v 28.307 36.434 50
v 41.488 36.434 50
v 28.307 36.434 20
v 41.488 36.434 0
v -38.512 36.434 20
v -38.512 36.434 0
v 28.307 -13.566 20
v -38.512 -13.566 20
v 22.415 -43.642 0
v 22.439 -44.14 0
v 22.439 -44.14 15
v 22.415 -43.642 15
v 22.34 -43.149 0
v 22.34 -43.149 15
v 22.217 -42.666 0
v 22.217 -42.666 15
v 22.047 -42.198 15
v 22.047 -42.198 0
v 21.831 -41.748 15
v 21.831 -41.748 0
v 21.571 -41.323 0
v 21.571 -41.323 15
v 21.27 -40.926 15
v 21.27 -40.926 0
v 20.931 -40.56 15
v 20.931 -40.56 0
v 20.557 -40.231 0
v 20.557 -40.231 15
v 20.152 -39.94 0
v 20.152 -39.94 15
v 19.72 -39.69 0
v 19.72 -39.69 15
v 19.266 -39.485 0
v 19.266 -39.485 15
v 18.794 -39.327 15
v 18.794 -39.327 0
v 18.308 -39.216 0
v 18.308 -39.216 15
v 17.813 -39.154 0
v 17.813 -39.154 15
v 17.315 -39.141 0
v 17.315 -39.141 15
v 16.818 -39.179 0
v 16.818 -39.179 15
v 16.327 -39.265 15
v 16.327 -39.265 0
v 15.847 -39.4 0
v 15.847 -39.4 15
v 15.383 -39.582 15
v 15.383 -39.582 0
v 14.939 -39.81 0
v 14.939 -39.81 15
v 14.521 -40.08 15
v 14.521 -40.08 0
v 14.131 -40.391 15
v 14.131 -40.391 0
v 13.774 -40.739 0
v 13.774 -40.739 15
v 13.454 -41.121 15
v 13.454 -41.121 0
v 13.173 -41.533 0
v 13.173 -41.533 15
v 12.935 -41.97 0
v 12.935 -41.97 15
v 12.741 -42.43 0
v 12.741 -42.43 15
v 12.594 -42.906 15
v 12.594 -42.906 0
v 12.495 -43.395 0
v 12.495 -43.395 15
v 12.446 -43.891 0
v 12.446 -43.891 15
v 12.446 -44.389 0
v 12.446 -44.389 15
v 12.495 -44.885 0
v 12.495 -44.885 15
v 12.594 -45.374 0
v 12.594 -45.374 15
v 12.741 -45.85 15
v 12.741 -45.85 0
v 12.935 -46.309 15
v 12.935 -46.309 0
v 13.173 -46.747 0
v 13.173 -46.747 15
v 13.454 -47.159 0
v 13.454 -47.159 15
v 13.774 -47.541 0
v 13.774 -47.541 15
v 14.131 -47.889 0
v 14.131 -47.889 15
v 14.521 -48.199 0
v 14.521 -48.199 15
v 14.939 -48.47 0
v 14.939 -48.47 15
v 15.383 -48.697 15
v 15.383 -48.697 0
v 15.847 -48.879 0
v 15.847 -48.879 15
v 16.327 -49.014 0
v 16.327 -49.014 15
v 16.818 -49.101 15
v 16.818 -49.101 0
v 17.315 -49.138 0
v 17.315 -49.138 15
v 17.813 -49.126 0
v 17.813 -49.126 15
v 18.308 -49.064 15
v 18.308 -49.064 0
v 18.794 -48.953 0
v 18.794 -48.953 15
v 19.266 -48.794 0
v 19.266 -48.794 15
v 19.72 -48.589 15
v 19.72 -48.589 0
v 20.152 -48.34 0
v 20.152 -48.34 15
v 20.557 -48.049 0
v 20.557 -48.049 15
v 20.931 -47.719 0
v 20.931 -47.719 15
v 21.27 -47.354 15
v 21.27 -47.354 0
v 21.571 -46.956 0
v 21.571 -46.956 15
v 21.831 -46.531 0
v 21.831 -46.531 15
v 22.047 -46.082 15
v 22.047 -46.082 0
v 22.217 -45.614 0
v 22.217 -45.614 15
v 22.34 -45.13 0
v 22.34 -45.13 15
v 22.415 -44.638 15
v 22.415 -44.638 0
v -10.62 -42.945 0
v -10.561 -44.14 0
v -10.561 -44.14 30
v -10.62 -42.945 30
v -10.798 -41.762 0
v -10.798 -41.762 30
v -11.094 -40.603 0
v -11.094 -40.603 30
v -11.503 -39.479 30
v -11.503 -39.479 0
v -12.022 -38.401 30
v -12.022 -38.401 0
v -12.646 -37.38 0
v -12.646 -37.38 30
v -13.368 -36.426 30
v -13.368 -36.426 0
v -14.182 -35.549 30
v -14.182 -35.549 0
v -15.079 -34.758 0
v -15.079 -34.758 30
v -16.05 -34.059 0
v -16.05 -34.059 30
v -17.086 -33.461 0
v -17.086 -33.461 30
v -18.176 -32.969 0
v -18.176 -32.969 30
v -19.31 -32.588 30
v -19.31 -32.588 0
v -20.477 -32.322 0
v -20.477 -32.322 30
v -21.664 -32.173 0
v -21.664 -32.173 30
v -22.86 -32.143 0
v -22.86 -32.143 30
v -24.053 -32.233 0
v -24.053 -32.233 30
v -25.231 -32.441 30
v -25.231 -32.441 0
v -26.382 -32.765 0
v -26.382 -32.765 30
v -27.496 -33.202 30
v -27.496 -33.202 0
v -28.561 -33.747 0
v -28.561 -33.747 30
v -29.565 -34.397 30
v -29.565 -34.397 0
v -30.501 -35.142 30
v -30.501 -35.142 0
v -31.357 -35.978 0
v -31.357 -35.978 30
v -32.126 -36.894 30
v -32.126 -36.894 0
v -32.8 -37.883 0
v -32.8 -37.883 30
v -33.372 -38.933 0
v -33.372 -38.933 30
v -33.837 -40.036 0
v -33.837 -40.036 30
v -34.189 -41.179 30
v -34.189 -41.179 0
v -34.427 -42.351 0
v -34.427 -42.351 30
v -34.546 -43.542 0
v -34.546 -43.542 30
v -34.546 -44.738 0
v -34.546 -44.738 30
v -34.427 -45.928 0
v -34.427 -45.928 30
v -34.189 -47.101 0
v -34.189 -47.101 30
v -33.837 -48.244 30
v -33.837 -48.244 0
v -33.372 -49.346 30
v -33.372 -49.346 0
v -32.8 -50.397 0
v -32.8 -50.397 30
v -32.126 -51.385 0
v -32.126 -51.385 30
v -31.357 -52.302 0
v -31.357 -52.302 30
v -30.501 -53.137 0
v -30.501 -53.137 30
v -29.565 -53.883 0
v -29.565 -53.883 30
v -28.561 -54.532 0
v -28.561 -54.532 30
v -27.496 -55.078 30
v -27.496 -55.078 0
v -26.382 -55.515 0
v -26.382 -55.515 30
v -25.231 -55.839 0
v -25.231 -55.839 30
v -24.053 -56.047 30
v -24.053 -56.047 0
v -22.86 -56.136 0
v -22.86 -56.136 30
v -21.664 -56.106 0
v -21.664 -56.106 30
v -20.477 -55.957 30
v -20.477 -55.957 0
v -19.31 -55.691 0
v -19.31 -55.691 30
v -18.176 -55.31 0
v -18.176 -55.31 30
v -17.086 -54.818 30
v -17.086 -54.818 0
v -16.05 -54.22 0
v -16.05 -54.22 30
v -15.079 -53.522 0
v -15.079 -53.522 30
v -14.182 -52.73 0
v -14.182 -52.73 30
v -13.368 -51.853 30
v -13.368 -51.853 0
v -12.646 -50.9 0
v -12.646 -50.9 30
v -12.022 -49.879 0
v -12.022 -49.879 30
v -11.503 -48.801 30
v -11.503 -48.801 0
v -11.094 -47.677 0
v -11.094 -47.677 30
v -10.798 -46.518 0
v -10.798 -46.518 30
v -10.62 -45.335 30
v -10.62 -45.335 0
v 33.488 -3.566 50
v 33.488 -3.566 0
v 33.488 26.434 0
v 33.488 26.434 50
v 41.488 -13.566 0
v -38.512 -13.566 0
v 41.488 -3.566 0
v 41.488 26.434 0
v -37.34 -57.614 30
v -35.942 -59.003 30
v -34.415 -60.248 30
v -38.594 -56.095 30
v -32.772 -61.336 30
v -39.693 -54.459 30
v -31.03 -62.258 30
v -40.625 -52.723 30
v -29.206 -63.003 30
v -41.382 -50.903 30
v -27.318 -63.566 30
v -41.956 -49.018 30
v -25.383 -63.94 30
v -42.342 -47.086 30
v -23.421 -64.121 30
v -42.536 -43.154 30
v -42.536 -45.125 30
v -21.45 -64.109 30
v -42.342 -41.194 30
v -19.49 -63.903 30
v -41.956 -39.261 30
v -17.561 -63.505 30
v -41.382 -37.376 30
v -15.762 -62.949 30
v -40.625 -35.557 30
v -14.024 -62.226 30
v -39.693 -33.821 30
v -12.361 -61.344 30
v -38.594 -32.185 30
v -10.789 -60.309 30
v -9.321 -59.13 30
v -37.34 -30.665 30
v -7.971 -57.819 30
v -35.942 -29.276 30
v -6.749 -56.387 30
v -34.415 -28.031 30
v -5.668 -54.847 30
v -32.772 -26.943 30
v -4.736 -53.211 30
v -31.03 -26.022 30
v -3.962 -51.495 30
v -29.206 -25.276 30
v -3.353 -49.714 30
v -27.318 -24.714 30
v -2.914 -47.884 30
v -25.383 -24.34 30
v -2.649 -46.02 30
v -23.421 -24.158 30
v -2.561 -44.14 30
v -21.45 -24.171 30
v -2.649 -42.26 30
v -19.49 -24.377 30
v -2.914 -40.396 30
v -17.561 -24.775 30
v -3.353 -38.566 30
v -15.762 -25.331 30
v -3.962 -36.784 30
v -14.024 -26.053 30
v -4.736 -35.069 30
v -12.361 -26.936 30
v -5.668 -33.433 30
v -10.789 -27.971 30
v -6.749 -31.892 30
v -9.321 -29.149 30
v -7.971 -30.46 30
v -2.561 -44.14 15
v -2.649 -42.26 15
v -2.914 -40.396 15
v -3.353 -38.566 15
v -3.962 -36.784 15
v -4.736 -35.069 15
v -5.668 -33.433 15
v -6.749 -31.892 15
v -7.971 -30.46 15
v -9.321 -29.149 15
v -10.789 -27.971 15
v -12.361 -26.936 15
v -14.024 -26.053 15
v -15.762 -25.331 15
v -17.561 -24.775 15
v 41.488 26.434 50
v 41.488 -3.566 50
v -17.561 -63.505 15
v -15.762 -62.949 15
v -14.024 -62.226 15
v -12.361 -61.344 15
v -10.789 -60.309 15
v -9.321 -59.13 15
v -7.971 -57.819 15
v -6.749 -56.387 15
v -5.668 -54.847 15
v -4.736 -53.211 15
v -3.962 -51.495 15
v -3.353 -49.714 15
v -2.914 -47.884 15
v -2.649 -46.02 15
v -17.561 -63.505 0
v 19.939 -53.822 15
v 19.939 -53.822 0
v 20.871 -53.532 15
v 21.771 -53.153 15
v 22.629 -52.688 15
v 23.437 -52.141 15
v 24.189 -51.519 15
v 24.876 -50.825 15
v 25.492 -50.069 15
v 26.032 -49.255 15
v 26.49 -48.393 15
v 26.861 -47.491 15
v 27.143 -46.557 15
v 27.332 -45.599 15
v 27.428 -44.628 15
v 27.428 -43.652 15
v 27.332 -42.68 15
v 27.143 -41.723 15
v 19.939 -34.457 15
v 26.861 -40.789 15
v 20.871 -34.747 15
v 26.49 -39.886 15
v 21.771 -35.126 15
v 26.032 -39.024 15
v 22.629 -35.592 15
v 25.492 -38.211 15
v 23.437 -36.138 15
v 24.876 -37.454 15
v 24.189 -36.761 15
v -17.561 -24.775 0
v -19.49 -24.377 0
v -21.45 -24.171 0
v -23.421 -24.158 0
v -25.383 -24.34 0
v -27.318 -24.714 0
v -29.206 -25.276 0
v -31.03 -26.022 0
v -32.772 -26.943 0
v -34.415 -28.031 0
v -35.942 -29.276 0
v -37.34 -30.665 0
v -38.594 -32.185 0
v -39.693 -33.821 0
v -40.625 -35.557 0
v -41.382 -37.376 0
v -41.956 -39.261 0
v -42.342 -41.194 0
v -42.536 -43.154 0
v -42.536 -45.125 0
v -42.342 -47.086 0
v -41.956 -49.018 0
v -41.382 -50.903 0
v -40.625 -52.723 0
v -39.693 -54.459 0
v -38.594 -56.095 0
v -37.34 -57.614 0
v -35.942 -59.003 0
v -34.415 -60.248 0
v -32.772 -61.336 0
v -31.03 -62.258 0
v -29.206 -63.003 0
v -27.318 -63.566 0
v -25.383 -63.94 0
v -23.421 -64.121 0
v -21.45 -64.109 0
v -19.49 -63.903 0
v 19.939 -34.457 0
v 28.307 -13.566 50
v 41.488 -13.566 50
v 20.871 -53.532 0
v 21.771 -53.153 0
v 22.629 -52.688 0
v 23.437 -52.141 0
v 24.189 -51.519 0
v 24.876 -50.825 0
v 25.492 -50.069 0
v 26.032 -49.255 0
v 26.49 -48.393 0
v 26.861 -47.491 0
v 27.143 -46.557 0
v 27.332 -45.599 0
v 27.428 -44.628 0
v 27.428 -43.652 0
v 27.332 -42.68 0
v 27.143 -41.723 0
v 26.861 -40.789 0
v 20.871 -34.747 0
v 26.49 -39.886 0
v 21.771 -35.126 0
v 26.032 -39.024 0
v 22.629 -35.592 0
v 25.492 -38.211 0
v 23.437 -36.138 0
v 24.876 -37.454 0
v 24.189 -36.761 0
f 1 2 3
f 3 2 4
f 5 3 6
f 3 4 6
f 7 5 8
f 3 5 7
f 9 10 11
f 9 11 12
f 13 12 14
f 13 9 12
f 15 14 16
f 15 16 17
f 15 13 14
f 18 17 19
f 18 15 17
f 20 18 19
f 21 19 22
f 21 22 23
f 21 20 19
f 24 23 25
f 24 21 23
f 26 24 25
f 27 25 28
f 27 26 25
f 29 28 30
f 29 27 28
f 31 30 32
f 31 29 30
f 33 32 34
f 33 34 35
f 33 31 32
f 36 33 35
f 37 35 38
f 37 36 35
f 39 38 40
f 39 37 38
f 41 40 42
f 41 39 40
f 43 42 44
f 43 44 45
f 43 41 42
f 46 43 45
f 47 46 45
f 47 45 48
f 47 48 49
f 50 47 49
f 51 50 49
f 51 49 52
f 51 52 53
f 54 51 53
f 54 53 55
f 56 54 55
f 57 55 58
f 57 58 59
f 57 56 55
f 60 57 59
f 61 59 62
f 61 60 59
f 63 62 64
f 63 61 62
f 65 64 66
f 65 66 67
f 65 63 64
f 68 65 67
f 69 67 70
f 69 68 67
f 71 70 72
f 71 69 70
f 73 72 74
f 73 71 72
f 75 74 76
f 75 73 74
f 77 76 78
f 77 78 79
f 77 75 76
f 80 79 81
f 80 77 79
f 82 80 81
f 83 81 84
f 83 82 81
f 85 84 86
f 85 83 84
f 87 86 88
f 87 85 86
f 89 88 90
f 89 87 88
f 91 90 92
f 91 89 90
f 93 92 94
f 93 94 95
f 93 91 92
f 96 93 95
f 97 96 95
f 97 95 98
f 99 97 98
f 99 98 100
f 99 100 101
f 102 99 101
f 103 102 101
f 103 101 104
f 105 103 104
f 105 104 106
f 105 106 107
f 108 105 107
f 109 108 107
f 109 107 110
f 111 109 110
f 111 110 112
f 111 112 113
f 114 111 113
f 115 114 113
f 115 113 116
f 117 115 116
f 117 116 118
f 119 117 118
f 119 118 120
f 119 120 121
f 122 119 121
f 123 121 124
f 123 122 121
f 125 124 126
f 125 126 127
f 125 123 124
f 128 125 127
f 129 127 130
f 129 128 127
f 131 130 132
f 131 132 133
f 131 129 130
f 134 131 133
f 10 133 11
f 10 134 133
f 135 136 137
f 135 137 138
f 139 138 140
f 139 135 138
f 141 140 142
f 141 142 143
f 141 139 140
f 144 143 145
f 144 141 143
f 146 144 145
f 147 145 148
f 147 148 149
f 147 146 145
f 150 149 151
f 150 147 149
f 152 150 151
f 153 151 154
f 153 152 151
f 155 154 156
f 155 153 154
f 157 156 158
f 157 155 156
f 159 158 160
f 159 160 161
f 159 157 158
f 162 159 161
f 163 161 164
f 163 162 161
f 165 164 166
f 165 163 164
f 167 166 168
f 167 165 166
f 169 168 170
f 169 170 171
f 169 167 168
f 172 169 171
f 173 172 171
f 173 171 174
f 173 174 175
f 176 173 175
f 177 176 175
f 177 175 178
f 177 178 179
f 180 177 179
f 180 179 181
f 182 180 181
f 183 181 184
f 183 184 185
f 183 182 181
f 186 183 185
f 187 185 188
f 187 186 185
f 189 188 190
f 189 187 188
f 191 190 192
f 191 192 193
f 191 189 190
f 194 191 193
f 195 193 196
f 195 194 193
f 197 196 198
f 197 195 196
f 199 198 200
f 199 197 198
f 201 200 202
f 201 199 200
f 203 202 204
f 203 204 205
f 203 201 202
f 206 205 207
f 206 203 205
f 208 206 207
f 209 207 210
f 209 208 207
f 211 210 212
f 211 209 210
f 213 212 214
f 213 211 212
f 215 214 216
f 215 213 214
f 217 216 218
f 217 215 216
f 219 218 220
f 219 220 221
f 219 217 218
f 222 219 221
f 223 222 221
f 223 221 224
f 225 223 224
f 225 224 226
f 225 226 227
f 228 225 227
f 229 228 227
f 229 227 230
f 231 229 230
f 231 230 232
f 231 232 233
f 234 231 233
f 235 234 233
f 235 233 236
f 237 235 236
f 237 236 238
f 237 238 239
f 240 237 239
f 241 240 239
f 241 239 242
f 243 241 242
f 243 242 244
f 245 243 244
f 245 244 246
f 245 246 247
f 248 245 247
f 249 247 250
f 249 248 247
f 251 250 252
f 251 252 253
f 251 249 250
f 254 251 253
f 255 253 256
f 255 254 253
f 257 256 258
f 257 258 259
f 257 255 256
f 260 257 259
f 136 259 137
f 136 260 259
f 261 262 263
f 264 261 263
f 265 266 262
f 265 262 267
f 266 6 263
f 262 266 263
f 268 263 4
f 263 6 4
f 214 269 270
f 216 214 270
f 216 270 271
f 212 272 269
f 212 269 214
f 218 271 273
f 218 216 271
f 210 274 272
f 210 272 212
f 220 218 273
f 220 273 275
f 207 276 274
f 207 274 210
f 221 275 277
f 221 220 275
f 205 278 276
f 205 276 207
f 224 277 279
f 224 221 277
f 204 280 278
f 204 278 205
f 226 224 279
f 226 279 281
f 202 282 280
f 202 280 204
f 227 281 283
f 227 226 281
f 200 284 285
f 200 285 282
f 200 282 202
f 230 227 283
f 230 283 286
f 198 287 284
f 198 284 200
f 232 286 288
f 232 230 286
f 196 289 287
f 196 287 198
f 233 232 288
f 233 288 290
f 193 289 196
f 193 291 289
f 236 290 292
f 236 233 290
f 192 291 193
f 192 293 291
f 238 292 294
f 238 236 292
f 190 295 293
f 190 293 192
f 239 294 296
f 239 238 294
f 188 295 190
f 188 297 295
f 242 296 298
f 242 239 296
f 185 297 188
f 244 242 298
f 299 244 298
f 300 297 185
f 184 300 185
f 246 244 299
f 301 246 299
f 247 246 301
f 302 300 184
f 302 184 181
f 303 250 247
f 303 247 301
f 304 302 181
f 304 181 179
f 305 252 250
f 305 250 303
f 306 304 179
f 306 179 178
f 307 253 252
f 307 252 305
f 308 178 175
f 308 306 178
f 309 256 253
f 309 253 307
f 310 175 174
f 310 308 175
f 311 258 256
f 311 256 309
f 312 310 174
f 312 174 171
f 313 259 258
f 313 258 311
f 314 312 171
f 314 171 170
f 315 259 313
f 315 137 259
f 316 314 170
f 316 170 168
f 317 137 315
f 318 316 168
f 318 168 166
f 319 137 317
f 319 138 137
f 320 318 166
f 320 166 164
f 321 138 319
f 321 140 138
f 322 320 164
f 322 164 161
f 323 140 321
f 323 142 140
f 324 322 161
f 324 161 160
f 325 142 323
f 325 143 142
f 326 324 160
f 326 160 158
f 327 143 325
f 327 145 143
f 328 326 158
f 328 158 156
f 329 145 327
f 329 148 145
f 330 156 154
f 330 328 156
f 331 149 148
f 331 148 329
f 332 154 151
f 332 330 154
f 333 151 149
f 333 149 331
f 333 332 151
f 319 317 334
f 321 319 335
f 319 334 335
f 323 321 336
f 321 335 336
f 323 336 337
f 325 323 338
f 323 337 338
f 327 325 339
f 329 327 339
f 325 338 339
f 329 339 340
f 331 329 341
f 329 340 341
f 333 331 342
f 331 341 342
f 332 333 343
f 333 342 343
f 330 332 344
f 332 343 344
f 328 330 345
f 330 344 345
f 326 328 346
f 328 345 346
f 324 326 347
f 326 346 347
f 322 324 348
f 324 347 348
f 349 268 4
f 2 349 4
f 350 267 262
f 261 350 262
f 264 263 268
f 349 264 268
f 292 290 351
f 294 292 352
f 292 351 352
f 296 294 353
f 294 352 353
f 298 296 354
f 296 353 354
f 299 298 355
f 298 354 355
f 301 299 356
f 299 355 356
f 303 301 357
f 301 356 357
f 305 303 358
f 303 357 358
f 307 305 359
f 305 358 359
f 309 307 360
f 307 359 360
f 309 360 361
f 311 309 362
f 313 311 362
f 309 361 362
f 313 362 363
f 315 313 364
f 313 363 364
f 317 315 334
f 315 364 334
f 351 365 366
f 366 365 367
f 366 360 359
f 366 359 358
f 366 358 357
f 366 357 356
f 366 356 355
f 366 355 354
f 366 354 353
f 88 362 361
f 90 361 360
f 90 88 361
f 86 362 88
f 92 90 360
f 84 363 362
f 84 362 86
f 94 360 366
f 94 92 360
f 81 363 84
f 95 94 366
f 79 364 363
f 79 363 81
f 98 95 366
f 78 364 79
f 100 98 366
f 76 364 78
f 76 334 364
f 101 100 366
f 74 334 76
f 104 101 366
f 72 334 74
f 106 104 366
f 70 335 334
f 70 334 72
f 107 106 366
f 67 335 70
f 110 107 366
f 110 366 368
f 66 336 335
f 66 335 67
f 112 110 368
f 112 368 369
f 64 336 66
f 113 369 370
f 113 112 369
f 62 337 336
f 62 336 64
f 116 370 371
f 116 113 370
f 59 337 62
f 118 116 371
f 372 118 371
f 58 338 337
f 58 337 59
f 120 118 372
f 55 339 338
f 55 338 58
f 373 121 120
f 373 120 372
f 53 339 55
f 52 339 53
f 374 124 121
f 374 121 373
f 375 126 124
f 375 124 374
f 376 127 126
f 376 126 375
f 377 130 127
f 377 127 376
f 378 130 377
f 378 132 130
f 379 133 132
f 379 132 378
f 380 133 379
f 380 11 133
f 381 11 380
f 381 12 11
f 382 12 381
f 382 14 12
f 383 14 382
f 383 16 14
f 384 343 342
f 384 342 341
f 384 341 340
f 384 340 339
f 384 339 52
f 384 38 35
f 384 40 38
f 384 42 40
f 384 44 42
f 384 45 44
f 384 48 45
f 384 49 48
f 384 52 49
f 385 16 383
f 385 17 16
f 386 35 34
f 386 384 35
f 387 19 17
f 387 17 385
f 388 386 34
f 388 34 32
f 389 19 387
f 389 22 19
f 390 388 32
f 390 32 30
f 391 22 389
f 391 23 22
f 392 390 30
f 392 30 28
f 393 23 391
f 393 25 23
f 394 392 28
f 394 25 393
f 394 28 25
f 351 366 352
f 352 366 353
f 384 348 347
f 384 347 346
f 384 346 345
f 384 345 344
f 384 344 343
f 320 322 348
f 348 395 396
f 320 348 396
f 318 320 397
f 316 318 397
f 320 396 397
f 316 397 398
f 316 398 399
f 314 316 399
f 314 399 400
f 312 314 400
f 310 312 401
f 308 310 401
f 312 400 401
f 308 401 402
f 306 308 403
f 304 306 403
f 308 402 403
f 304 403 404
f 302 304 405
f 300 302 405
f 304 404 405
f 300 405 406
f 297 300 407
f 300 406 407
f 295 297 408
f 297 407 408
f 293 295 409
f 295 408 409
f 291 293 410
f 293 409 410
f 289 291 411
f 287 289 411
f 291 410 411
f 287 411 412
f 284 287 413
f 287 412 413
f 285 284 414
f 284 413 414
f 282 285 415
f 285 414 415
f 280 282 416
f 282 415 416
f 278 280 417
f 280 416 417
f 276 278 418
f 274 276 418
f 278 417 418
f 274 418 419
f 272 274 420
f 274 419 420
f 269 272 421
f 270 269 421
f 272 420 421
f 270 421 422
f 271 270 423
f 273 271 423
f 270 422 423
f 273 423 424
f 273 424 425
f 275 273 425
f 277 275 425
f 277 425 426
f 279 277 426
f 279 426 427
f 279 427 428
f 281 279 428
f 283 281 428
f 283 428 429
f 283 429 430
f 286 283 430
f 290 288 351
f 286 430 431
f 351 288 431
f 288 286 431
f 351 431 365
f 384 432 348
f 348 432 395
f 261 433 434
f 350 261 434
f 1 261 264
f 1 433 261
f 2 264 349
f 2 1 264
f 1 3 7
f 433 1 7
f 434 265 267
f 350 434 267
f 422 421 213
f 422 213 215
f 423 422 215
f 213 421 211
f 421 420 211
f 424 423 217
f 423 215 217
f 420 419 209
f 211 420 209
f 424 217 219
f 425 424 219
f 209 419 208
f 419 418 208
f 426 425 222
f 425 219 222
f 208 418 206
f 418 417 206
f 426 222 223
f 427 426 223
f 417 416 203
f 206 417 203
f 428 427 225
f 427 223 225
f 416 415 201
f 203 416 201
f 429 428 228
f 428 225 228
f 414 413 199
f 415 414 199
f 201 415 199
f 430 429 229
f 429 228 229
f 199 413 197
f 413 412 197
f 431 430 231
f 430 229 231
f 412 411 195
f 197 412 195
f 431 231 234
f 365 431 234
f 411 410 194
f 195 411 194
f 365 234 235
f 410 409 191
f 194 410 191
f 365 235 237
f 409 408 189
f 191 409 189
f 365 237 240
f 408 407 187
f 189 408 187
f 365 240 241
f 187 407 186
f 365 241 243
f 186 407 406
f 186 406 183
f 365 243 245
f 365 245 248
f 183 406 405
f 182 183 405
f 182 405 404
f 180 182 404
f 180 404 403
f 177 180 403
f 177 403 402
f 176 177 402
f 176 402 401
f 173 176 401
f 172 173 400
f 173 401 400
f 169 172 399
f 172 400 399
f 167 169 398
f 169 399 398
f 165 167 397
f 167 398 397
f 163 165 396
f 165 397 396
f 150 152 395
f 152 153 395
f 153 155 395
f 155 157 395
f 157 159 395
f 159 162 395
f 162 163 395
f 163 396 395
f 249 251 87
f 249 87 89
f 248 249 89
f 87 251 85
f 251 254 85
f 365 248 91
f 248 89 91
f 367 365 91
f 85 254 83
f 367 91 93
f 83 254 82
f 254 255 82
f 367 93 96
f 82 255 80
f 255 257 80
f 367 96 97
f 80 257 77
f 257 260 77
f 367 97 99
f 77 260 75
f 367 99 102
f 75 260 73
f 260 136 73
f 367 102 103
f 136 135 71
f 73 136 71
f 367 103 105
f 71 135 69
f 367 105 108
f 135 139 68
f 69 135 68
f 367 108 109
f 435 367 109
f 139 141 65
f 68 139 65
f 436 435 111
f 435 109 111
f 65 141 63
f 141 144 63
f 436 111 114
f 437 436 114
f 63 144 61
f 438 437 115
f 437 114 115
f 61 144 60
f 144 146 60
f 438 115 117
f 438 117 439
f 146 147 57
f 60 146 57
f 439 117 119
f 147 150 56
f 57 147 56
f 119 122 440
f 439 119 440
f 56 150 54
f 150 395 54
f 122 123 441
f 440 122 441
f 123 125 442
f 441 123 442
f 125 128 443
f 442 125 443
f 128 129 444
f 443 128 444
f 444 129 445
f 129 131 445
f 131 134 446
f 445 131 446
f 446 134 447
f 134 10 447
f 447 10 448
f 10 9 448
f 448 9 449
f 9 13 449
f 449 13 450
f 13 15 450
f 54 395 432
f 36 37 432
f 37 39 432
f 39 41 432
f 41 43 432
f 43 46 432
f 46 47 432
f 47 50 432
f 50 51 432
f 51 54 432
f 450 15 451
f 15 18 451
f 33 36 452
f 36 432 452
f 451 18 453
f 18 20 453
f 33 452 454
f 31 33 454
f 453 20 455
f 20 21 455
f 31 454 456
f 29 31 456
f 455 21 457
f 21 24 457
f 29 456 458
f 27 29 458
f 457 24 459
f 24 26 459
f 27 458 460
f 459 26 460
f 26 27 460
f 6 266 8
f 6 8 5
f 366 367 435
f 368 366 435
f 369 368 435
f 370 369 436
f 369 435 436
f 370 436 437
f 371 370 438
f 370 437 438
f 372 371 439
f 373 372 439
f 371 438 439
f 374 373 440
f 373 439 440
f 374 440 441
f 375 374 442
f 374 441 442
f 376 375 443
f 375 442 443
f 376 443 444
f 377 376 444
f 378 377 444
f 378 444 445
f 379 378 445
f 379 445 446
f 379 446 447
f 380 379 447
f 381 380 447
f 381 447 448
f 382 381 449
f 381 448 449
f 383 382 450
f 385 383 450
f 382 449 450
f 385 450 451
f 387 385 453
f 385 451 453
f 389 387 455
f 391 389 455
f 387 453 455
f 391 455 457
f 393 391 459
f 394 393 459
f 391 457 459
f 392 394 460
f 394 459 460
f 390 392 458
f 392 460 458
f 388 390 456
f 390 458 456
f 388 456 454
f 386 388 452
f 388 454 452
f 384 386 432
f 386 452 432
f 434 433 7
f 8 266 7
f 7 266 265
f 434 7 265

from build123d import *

# Parameters (mm, degrees)
F0_W     = 66.818652
F0_H     = 50
F1_DEPTH = 20
F2_DEPTH = 50
F3_R     = 12
F4_DEPTH = 30
F3_R_2   = 5
F5_DEPTH = 15


with BuildPart() as f1:
    # F0 (on Top) → F1 (new body)
    with BuildSketch(Plane.XY):
        with Locations((-5.102272, 11.433766)):
            Rectangle(F0_W, F0_H)
    extrude(amount=F1_DEPTH)

    # F0 (on Top) → F2 (join)
    with BuildSketch(Plane.XY):
        Polygon((41.488402, 36.433766), (28.307054, 36.433766), (28.307054, -13.566234), (41.488402, -13.566234), (41.488402, -3.566234), (33.488402, -3.566234), (33.488402, 26.433766), (41.488402, 26.433766), align=None)
    extrude(amount=F2_DEPTH)


with BuildPart() as f4:
    # F3 (on Top) → F4 (new body)
    with BuildSketch(Plane.XY):
        with BuildLine():
            ThreePointArc((-17.560557, -63.504676), (-6.749169, -56.387208), (-2.560557, -44.139759))
            ThreePointArc((-2.560557, -44.139759), (-6.749169, -31.892311), (-17.560557, -24.774843))
            ThreePointArc((-17.560557, -24.774843), (-42.560557, -44.139759), (-17.560557, -63.504676))
        make_face()
        with Locations((-22.560557, -44.139759)):
            Circle(F3_R, mode=Mode.SUBTRACT)
    extrude(amount=F4_DEPTH)

    # F3 (on Top) → F5 (join)
    with BuildSketch(Plane.XY):
        with BuildLine():
            ThreePointArc((-17.560557, -24.774843), (-6.749169, -31.892311), (-2.560557, -44.139759))
            ThreePointArc((-2.560557, -44.139759), (-6.749169, -56.387208), (-17.560557, -63.504676))
            Line((-17.560557, -63.504676), (19.939443, -53.822218))
            ThreePointArc((19.939443, -53.822218), (27.439443, -44.139759), (19.939443, -34.457301))
            Line((19.939443, -34.457301), (-17.560557, -24.774843))
        make_face()
        with Locations((17.439443, -44.139759)):
            Circle(F3_R_2, mode=Mode.SUBTRACT)
    extrude(amount=F5_DEPTH)


solid = Compound([f1.part, f4.part])
